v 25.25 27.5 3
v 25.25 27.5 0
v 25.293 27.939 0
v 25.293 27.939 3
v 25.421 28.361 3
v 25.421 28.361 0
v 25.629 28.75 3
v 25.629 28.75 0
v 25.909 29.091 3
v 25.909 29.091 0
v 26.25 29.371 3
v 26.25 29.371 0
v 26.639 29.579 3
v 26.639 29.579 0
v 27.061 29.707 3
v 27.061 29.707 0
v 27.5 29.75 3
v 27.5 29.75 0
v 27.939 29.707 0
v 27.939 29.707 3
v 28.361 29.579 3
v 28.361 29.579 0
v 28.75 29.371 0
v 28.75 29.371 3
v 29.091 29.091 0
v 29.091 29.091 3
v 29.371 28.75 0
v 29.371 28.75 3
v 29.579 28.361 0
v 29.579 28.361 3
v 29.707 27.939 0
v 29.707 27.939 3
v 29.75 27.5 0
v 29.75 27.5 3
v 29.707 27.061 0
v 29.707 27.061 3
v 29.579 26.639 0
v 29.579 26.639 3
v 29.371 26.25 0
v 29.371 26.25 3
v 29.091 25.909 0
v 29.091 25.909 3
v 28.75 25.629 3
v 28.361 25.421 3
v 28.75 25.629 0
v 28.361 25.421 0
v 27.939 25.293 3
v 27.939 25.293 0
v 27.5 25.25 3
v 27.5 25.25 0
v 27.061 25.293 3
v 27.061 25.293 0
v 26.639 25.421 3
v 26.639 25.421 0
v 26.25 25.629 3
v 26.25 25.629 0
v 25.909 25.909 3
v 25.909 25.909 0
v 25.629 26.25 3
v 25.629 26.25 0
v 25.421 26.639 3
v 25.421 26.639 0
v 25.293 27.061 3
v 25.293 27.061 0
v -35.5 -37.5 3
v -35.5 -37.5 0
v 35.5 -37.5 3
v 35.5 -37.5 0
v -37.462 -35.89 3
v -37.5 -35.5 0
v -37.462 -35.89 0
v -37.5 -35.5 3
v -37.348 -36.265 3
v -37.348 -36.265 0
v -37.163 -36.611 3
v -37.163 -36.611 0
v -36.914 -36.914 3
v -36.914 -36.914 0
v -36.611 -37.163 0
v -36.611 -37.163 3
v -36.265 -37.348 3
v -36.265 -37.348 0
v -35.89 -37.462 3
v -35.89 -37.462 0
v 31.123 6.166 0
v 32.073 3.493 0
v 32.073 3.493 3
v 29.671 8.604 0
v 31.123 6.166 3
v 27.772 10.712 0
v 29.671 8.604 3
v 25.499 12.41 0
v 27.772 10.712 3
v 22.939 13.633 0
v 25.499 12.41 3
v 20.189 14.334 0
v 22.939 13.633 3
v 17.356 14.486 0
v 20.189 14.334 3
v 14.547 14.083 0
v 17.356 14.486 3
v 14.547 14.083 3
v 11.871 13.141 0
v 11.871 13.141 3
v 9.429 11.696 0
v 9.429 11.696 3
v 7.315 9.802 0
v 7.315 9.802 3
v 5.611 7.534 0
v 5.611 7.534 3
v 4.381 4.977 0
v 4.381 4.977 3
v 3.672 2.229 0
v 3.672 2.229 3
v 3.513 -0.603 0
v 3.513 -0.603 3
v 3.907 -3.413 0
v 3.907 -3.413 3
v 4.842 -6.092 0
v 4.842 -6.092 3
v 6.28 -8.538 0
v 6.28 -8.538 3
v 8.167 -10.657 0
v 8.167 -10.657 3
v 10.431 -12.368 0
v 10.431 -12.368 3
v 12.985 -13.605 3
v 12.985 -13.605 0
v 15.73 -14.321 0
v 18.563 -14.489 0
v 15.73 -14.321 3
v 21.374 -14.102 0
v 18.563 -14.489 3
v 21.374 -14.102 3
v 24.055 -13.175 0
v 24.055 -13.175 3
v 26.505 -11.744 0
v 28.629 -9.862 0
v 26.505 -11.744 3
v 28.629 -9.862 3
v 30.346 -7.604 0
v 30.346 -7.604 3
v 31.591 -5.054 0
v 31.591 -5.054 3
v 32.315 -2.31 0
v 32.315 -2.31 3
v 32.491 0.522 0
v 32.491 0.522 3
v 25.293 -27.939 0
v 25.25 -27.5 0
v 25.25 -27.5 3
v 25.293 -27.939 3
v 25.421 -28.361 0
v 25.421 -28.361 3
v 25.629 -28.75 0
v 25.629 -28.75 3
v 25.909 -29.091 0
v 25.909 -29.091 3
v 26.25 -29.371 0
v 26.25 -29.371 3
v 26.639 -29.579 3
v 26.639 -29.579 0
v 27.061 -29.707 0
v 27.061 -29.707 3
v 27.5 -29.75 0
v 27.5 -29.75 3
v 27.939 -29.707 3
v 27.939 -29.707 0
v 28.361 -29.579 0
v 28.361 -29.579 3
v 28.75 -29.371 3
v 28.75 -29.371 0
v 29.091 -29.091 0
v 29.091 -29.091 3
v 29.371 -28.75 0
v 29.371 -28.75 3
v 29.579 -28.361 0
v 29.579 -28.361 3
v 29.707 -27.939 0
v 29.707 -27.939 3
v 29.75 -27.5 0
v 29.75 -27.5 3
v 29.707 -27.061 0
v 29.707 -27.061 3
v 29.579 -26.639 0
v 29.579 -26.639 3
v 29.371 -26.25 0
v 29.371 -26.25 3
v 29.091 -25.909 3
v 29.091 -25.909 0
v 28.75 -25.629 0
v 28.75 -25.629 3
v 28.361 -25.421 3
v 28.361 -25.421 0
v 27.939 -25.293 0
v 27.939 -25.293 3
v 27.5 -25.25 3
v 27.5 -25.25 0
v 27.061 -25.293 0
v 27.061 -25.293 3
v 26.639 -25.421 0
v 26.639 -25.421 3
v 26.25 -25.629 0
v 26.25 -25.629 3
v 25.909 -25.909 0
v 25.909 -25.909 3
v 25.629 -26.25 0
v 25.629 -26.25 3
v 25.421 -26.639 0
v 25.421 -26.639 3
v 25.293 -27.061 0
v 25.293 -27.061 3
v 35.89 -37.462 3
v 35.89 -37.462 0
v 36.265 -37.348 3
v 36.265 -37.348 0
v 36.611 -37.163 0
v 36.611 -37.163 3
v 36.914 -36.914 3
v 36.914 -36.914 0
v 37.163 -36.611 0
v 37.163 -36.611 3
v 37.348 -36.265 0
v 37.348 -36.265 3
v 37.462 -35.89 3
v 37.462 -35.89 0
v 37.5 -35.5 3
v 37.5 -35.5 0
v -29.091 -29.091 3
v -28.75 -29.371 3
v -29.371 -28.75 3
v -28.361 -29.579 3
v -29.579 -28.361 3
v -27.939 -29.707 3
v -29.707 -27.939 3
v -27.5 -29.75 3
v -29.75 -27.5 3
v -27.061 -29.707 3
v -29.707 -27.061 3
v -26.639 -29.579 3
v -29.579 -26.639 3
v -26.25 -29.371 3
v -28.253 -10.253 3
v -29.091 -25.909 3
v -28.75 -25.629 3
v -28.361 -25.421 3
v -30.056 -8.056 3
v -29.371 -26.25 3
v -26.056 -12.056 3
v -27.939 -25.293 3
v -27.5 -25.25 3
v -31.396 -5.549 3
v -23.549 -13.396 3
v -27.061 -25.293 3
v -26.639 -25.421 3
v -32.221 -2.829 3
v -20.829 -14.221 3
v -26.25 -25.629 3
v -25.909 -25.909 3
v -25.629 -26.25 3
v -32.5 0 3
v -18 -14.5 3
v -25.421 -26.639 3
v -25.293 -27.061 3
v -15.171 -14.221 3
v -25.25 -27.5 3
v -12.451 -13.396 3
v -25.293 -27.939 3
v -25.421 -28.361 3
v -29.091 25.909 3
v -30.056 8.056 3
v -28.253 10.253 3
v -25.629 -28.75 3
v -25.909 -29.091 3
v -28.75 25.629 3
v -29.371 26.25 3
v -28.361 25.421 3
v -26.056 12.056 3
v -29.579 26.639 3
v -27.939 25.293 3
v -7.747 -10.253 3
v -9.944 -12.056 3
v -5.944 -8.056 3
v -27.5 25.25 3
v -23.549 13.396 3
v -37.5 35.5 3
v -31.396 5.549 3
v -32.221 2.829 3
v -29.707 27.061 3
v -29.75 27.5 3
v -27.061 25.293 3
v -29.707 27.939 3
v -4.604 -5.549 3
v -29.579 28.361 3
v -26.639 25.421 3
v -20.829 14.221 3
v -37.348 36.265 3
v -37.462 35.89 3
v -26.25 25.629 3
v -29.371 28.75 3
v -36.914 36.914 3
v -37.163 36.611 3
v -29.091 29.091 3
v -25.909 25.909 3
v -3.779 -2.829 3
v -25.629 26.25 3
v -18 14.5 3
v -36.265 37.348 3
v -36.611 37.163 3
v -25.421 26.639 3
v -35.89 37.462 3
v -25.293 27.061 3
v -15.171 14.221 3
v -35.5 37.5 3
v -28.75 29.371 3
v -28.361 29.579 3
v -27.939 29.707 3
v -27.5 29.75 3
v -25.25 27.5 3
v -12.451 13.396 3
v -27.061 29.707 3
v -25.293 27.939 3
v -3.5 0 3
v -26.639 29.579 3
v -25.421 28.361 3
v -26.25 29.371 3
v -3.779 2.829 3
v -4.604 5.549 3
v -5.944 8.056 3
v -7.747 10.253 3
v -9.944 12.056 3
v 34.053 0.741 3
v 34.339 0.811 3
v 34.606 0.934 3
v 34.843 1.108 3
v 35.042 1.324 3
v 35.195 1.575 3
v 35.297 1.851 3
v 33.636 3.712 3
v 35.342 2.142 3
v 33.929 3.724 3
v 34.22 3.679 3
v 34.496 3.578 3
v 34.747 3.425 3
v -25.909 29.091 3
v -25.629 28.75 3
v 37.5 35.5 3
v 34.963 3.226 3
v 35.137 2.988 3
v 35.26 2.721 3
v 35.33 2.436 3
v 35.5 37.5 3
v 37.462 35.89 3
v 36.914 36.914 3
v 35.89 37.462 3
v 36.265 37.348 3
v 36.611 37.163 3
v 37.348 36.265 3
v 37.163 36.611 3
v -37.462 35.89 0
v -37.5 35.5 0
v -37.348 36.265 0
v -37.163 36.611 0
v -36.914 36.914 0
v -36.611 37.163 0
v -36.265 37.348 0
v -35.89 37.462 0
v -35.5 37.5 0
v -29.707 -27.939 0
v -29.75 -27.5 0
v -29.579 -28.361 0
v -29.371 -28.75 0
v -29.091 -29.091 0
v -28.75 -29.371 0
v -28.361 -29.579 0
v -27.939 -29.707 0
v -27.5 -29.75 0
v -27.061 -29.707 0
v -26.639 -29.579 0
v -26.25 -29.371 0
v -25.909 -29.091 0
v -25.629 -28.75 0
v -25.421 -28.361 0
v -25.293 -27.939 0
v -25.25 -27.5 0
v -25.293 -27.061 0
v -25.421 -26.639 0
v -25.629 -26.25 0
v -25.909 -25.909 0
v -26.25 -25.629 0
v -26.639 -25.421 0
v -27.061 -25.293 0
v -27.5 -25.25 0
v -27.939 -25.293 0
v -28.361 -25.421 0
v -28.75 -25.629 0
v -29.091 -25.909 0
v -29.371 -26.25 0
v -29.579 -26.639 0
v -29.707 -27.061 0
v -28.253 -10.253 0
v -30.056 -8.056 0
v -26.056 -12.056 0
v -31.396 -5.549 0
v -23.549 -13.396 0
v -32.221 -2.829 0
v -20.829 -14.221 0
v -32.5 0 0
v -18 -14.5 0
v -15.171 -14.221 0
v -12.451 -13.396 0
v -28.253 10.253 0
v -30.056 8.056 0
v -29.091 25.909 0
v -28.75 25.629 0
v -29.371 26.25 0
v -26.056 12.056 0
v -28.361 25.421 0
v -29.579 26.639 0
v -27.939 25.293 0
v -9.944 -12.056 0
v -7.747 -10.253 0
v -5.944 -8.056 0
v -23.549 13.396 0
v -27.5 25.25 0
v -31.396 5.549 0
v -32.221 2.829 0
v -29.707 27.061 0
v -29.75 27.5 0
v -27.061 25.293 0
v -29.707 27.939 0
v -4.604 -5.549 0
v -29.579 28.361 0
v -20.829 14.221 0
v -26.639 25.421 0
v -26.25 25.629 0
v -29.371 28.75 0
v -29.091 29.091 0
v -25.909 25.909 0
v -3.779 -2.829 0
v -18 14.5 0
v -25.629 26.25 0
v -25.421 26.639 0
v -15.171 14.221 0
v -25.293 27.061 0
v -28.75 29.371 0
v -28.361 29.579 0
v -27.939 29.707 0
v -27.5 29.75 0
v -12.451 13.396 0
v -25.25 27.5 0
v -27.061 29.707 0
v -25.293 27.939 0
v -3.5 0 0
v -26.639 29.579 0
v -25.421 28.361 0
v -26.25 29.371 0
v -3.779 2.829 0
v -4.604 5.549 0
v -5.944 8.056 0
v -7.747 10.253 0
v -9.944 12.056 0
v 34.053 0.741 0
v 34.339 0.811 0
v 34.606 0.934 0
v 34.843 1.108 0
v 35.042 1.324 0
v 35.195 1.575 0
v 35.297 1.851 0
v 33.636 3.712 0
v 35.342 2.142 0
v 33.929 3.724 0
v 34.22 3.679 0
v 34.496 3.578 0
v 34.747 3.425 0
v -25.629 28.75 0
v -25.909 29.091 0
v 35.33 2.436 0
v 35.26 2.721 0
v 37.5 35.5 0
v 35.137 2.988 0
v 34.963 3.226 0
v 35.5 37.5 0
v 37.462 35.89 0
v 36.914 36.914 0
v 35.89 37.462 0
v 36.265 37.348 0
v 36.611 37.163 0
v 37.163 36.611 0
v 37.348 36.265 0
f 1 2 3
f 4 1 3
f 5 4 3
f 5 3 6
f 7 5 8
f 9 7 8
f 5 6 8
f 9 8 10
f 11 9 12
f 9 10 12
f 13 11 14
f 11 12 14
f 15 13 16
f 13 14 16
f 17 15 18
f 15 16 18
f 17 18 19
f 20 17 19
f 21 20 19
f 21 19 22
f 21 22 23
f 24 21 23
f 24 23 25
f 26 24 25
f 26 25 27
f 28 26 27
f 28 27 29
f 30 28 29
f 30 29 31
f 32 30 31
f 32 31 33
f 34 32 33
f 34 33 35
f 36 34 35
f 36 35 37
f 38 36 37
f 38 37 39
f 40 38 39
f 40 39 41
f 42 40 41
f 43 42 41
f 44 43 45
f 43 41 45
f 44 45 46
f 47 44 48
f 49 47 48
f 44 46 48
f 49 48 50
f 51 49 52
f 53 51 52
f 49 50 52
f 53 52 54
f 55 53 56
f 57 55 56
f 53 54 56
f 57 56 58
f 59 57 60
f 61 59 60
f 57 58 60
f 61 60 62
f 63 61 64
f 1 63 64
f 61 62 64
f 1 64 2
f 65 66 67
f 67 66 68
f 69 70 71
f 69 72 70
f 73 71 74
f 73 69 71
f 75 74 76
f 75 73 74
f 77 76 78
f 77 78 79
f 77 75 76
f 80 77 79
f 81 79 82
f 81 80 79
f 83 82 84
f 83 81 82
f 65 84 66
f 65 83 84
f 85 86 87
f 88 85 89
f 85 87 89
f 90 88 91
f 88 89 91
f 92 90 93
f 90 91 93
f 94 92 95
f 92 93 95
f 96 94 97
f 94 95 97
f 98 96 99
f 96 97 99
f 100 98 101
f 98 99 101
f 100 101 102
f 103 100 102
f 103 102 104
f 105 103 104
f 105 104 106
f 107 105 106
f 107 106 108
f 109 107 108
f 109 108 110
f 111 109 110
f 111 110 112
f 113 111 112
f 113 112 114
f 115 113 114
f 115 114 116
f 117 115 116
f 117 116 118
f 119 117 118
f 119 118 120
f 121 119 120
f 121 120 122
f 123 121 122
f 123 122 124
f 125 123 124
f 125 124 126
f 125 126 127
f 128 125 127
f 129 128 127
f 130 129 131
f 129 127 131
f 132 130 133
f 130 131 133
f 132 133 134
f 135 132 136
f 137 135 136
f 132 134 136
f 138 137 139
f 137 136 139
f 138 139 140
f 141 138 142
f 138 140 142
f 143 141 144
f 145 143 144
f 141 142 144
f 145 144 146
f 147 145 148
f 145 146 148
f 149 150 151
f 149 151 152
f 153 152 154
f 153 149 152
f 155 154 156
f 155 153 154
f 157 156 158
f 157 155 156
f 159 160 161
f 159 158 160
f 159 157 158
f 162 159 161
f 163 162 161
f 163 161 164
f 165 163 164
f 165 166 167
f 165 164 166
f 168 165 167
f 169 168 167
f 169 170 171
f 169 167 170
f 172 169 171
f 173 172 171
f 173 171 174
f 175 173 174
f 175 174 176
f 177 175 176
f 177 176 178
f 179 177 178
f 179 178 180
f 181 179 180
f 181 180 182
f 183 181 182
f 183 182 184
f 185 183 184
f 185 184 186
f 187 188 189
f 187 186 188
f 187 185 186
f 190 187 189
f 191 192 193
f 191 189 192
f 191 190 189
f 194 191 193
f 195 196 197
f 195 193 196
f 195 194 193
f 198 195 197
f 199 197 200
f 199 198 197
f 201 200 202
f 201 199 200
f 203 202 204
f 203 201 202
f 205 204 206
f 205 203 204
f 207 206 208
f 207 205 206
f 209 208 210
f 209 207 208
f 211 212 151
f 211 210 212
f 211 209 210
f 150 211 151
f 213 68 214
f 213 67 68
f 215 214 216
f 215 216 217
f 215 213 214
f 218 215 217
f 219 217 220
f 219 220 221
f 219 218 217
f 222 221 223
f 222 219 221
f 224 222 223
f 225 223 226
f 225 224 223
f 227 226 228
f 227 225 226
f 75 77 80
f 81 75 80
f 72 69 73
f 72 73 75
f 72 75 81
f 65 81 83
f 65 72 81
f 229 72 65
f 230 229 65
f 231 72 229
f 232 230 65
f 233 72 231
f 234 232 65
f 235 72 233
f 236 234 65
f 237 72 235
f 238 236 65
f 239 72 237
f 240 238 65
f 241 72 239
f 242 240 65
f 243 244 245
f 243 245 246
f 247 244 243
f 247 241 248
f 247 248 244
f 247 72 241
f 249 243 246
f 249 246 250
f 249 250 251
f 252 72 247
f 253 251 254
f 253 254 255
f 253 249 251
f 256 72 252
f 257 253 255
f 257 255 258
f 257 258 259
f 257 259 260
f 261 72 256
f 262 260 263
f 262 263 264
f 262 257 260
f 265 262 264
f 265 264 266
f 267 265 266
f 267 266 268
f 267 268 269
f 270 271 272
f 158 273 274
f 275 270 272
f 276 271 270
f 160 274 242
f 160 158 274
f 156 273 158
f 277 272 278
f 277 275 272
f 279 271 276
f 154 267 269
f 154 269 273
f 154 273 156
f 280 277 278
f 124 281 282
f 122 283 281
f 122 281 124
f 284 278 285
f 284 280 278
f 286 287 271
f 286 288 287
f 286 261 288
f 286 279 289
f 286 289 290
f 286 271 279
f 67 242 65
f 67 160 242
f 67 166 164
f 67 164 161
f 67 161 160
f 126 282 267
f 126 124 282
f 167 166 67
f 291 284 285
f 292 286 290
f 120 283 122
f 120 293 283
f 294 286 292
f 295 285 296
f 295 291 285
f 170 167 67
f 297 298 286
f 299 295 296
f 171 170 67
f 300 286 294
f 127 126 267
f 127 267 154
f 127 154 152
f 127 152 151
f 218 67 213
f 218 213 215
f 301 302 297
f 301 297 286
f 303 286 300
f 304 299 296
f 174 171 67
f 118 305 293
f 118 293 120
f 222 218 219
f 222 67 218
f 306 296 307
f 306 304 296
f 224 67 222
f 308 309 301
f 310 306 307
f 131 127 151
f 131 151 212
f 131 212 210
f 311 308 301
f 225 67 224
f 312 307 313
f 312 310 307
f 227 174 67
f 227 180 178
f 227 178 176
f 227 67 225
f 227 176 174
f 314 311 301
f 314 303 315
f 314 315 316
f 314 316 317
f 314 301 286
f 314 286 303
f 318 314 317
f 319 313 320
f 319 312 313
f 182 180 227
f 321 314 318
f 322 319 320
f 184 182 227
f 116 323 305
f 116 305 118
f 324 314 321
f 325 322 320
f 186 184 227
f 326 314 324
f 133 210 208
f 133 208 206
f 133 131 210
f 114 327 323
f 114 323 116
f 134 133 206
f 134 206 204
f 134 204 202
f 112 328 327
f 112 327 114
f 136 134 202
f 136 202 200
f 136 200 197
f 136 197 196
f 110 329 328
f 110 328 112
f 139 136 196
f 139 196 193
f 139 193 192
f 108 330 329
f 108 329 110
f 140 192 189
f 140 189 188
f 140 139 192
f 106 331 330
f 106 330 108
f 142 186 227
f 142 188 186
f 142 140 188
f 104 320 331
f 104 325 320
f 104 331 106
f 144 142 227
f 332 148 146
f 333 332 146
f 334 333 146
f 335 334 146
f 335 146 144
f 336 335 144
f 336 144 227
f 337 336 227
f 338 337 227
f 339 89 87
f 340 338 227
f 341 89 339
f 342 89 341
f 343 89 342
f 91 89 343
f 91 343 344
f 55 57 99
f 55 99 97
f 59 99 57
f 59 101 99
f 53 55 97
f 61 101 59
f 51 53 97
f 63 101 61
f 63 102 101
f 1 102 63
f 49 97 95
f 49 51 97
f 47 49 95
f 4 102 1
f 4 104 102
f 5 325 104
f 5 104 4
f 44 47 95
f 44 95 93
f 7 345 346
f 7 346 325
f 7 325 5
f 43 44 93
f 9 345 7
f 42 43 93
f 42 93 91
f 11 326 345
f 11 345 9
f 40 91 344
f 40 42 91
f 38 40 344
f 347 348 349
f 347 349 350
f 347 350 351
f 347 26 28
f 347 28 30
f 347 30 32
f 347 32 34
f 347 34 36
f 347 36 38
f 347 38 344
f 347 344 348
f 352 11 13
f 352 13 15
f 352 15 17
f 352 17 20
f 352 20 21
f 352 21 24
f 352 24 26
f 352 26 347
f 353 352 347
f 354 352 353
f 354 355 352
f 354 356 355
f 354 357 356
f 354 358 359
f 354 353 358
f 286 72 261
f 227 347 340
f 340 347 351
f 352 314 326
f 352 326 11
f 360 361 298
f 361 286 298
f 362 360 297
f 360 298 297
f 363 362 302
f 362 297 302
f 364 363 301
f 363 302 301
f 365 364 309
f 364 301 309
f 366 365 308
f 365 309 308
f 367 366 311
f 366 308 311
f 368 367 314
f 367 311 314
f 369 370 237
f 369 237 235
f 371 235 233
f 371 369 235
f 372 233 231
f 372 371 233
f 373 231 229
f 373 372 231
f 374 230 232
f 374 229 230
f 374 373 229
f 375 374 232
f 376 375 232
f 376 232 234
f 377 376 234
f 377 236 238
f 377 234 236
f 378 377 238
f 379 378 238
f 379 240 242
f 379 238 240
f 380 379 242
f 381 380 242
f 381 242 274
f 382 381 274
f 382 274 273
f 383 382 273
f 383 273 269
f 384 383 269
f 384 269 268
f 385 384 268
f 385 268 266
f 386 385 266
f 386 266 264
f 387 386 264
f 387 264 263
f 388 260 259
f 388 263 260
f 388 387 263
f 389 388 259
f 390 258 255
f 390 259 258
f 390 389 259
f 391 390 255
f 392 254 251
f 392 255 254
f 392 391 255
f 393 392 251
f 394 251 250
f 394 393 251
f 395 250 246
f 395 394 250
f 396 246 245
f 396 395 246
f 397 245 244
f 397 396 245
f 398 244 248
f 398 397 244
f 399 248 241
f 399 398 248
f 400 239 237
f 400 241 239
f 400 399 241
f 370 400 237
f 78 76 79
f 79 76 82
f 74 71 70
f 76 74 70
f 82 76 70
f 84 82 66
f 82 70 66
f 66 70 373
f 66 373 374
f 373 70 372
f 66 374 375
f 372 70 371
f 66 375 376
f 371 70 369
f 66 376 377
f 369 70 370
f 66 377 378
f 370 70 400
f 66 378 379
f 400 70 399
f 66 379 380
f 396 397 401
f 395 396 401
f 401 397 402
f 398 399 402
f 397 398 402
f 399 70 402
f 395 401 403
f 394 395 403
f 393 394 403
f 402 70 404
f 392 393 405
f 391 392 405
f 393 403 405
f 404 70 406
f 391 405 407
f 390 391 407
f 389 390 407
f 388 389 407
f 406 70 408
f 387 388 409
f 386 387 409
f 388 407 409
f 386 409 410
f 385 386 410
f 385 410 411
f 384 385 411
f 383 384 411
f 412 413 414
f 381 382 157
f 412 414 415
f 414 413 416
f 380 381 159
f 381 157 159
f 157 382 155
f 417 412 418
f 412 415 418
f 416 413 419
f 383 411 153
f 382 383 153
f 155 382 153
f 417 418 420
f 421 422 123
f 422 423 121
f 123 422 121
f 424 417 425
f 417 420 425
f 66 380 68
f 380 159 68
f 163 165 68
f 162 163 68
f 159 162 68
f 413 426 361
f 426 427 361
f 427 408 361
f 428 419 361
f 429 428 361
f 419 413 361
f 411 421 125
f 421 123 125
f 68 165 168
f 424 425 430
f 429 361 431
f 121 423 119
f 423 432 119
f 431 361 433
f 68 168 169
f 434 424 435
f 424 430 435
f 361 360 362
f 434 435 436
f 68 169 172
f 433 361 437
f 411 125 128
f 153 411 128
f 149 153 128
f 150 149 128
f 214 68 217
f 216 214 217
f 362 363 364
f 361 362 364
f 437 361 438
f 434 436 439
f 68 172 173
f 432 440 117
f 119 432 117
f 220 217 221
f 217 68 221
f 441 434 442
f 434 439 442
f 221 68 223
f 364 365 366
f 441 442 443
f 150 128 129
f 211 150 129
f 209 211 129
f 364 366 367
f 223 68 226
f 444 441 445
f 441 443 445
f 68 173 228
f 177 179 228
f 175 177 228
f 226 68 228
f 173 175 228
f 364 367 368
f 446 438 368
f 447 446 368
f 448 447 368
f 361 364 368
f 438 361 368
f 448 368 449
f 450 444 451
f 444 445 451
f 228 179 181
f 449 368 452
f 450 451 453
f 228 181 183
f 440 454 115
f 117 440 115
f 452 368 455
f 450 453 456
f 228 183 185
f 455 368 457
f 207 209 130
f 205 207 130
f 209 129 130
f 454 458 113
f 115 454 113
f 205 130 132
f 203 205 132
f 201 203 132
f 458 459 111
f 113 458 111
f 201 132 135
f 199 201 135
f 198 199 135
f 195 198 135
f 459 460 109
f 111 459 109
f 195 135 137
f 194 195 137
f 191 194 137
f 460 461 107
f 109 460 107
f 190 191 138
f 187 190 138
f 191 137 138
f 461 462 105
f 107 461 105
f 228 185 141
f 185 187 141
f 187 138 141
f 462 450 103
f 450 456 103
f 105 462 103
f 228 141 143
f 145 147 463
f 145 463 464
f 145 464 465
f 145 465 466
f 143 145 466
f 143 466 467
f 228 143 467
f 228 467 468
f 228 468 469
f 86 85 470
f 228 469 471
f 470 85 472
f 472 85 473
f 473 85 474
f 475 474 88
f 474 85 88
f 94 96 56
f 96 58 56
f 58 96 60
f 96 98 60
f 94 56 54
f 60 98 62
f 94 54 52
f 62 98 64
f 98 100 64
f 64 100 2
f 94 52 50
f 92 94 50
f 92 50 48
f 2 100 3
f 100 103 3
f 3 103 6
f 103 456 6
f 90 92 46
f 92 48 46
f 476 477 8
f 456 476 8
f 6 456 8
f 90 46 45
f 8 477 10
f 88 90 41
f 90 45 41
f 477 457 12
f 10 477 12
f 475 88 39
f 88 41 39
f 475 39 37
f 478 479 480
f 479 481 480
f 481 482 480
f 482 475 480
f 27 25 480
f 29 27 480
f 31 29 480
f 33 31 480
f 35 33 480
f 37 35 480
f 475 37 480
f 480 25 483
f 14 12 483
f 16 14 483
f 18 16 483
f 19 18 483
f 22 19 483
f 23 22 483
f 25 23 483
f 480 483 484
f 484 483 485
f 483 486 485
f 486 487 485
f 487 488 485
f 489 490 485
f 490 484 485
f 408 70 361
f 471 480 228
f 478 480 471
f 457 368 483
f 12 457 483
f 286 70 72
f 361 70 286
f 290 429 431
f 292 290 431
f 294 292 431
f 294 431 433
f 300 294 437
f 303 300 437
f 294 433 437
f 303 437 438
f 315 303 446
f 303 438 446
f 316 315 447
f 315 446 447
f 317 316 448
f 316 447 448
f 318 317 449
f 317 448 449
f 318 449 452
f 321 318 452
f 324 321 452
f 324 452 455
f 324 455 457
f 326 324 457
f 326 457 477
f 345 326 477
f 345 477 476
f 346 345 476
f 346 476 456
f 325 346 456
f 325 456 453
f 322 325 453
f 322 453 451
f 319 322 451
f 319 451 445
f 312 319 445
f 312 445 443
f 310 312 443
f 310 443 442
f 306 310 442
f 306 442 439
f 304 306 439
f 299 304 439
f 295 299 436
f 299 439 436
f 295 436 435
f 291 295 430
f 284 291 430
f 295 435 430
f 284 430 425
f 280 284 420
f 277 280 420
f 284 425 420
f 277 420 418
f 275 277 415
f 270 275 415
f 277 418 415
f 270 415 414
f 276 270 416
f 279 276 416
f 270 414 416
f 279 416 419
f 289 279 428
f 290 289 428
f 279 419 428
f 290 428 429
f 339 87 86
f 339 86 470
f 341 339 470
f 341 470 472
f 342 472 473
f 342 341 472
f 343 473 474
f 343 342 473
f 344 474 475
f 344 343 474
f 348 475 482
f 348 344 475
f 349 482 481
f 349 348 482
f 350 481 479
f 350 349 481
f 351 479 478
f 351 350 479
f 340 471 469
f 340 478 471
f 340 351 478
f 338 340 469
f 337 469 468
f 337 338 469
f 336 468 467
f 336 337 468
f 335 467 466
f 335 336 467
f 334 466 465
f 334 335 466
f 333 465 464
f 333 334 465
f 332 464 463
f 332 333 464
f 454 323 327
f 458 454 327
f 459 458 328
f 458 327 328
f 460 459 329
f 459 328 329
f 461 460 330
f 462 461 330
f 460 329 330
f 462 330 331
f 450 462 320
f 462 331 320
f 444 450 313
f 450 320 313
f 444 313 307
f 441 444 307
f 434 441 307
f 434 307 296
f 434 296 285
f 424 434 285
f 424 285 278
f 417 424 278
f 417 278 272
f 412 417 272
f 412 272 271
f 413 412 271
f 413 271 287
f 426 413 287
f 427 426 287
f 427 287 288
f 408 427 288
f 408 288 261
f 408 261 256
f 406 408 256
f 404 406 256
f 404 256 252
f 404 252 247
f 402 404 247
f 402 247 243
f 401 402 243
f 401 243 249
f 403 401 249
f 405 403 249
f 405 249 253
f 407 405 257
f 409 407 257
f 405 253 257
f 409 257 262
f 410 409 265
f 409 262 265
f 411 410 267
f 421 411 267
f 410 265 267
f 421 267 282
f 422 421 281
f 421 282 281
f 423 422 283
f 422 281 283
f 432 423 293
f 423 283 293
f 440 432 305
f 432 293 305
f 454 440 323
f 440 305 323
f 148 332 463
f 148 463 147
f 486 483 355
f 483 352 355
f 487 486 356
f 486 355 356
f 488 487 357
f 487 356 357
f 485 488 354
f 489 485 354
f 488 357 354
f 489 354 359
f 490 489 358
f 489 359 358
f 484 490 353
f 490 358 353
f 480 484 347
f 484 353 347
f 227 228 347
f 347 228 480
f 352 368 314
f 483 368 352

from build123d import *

# Parameters (mm, degrees)
SKIZZE1_W                       = 75
SKIZZE1_H                       = 75
AUFSATZ_LINEAR_AUSTRAGEN1_DEPTH = 3
SKIZZE2_R                       = 14.5
SCHNITT_LINEAR_AUSTRAGEN1_DEPTH = 4
VERRUNDUNG1_R                   = 2
DURCHGANGSLOCH_F_R_M41_D        = 4.5
SCHNITT_LINEAR_AUSTRAGEN2_DEPTH = 4


with BuildPart() as part:
    # Skizze1 → Aufsatz-Linear austragen1 (new body)
    with BuildSketch(Plane.XY):
        Rectangle(SKIZZE1_W, SKIZZE1_H)
    extrude(amount=AUFSATZ_LINEAR_AUSTRAGEN1_DEPTH)

    # Skizze2 → Schnitt-Linear austragen1 (cut, through all)
    with BuildSketch(Plane.XY.offset(3)):
        with Locations((-18, 0)):
            Circle(SKIZZE2_R)
        with Locations((18, 0)):
            Circle(SKIZZE2_R)
    extrude(amount=-SCHNITT_LINEAR_AUSTRAGEN1_DEPTH, mode=Mode.SUBTRACT)

    # Verrundung1
    verrundung1_edges = [part.edges().sort_by_distance(p)[0] for p in [
        (37.5, -37.5, 1.5),
        (-37.5, -37.5, 1.5),
        (-37.5, 37.5, 1.5),
        (37.5, 37.5, 1.5),
    ]]
    fillet(verrundung1_edges, radius=VERRUNDUNG1_R)

    # Durchgangsloch für M41 (through all)
    with Locations(Plane.XY.offset(3)):
        with Locations((27.5, 27.5), (-27.5, 27.5)):
            durchgangsloch_f_r_m41 = Hole(DURCHGANGSLOCH_F_R_M41_D / 2)

    # Spiegeln1: Durchgangsloch für M41 across plane
    add(durchgangsloch_f_r_m41.mirror(Plane.ZX), mode=Mode.SUBTRACT)

    # Skizze6 → Schnitt-Linear austragen2 (cut, through all)
    with BuildSketch(Plane.XY.offset(3)):
        with BuildLine():
            Line((17.791240349, 1.485402103), (33.635529448, 3.712171718))
            ThreePointArc((33.635529448, 3.712171718), (35.329691203, 2.435529267), (34.053048751, 0.741367512))
            Line((34.053048751, 0.741367512), (18.208759651, -1.485402103))
            ThreePointArc((18.208759651, -1.485402103), (16.514597897, -0.208759651), (17.791240349, 1.485402103))
        make_face()
    extrude(amount=-SCHNITT_LINEAR_AUSTRAGEN2_DEPTH, mode=Mode.SUBTRACT)


solid = part.part
